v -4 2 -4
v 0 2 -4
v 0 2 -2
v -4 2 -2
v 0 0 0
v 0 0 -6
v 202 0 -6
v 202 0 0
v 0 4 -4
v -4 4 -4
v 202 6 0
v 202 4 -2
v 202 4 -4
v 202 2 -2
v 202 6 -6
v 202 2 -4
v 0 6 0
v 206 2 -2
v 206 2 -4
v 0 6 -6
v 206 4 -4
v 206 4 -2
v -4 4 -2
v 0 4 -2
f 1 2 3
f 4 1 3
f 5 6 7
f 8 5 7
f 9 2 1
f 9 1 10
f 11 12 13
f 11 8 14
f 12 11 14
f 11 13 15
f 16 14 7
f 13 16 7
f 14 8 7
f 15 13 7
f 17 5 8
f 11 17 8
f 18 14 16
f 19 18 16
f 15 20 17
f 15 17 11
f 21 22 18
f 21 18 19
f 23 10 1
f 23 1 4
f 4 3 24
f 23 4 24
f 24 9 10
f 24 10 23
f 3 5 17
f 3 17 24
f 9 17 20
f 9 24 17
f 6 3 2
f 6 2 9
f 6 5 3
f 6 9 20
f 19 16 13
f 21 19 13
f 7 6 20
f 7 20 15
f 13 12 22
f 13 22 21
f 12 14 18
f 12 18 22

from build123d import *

# Parameters (mm, degrees)
SKICA1_W                = 202
SKICA1_H                = 6
P_IDAT_VYSUNUT_M1_DEPTH = 6
SKICA2_W                = 2
SKICA2_H                = 2
P_IDAT_VYSUNUT_M2_DEPTH = 4
SKICA3_W                = 2
SKICA3_H                = 2
P_IDAT_VYSUNUT_M3_DEPTH = 4


with BuildPart() as part:
    # Skica1 → Přidat vysunutím1 (new body)
    with BuildSketch(Plane(origin=(0, 0, 0), x_dir=(1, 0, 0), z_dir=(0, 1, 0))):
        with Locations((101, 3)):
            Rectangle(SKICA1_W, SKICA1_H)
    extrude(amount=P_IDAT_VYSUNUT_M1_DEPTH)

    # Skica2 → Přidat vysunutím2 (add)
    with BuildSketch(Plane.ZY):
        with Locations((-3, 3)):
            Rectangle(SKICA2_W, SKICA2_H)
    extrude(amount=P_IDAT_VYSUNUT_M2_DEPTH)

    # Skica3 → Přidat vysunutím3 (add)
    with BuildSketch(Plane(origin=(202, 0, 0), x_dir=(0, 0, -1), z_dir=(1, 0, 0))):
        with Locations((3, 3)):
            Rectangle(SKICA3_W, SKICA3_H)
    extrude(amount=P_IDAT_VYSUNUT_M3_DEPTH)


solid = part.part
